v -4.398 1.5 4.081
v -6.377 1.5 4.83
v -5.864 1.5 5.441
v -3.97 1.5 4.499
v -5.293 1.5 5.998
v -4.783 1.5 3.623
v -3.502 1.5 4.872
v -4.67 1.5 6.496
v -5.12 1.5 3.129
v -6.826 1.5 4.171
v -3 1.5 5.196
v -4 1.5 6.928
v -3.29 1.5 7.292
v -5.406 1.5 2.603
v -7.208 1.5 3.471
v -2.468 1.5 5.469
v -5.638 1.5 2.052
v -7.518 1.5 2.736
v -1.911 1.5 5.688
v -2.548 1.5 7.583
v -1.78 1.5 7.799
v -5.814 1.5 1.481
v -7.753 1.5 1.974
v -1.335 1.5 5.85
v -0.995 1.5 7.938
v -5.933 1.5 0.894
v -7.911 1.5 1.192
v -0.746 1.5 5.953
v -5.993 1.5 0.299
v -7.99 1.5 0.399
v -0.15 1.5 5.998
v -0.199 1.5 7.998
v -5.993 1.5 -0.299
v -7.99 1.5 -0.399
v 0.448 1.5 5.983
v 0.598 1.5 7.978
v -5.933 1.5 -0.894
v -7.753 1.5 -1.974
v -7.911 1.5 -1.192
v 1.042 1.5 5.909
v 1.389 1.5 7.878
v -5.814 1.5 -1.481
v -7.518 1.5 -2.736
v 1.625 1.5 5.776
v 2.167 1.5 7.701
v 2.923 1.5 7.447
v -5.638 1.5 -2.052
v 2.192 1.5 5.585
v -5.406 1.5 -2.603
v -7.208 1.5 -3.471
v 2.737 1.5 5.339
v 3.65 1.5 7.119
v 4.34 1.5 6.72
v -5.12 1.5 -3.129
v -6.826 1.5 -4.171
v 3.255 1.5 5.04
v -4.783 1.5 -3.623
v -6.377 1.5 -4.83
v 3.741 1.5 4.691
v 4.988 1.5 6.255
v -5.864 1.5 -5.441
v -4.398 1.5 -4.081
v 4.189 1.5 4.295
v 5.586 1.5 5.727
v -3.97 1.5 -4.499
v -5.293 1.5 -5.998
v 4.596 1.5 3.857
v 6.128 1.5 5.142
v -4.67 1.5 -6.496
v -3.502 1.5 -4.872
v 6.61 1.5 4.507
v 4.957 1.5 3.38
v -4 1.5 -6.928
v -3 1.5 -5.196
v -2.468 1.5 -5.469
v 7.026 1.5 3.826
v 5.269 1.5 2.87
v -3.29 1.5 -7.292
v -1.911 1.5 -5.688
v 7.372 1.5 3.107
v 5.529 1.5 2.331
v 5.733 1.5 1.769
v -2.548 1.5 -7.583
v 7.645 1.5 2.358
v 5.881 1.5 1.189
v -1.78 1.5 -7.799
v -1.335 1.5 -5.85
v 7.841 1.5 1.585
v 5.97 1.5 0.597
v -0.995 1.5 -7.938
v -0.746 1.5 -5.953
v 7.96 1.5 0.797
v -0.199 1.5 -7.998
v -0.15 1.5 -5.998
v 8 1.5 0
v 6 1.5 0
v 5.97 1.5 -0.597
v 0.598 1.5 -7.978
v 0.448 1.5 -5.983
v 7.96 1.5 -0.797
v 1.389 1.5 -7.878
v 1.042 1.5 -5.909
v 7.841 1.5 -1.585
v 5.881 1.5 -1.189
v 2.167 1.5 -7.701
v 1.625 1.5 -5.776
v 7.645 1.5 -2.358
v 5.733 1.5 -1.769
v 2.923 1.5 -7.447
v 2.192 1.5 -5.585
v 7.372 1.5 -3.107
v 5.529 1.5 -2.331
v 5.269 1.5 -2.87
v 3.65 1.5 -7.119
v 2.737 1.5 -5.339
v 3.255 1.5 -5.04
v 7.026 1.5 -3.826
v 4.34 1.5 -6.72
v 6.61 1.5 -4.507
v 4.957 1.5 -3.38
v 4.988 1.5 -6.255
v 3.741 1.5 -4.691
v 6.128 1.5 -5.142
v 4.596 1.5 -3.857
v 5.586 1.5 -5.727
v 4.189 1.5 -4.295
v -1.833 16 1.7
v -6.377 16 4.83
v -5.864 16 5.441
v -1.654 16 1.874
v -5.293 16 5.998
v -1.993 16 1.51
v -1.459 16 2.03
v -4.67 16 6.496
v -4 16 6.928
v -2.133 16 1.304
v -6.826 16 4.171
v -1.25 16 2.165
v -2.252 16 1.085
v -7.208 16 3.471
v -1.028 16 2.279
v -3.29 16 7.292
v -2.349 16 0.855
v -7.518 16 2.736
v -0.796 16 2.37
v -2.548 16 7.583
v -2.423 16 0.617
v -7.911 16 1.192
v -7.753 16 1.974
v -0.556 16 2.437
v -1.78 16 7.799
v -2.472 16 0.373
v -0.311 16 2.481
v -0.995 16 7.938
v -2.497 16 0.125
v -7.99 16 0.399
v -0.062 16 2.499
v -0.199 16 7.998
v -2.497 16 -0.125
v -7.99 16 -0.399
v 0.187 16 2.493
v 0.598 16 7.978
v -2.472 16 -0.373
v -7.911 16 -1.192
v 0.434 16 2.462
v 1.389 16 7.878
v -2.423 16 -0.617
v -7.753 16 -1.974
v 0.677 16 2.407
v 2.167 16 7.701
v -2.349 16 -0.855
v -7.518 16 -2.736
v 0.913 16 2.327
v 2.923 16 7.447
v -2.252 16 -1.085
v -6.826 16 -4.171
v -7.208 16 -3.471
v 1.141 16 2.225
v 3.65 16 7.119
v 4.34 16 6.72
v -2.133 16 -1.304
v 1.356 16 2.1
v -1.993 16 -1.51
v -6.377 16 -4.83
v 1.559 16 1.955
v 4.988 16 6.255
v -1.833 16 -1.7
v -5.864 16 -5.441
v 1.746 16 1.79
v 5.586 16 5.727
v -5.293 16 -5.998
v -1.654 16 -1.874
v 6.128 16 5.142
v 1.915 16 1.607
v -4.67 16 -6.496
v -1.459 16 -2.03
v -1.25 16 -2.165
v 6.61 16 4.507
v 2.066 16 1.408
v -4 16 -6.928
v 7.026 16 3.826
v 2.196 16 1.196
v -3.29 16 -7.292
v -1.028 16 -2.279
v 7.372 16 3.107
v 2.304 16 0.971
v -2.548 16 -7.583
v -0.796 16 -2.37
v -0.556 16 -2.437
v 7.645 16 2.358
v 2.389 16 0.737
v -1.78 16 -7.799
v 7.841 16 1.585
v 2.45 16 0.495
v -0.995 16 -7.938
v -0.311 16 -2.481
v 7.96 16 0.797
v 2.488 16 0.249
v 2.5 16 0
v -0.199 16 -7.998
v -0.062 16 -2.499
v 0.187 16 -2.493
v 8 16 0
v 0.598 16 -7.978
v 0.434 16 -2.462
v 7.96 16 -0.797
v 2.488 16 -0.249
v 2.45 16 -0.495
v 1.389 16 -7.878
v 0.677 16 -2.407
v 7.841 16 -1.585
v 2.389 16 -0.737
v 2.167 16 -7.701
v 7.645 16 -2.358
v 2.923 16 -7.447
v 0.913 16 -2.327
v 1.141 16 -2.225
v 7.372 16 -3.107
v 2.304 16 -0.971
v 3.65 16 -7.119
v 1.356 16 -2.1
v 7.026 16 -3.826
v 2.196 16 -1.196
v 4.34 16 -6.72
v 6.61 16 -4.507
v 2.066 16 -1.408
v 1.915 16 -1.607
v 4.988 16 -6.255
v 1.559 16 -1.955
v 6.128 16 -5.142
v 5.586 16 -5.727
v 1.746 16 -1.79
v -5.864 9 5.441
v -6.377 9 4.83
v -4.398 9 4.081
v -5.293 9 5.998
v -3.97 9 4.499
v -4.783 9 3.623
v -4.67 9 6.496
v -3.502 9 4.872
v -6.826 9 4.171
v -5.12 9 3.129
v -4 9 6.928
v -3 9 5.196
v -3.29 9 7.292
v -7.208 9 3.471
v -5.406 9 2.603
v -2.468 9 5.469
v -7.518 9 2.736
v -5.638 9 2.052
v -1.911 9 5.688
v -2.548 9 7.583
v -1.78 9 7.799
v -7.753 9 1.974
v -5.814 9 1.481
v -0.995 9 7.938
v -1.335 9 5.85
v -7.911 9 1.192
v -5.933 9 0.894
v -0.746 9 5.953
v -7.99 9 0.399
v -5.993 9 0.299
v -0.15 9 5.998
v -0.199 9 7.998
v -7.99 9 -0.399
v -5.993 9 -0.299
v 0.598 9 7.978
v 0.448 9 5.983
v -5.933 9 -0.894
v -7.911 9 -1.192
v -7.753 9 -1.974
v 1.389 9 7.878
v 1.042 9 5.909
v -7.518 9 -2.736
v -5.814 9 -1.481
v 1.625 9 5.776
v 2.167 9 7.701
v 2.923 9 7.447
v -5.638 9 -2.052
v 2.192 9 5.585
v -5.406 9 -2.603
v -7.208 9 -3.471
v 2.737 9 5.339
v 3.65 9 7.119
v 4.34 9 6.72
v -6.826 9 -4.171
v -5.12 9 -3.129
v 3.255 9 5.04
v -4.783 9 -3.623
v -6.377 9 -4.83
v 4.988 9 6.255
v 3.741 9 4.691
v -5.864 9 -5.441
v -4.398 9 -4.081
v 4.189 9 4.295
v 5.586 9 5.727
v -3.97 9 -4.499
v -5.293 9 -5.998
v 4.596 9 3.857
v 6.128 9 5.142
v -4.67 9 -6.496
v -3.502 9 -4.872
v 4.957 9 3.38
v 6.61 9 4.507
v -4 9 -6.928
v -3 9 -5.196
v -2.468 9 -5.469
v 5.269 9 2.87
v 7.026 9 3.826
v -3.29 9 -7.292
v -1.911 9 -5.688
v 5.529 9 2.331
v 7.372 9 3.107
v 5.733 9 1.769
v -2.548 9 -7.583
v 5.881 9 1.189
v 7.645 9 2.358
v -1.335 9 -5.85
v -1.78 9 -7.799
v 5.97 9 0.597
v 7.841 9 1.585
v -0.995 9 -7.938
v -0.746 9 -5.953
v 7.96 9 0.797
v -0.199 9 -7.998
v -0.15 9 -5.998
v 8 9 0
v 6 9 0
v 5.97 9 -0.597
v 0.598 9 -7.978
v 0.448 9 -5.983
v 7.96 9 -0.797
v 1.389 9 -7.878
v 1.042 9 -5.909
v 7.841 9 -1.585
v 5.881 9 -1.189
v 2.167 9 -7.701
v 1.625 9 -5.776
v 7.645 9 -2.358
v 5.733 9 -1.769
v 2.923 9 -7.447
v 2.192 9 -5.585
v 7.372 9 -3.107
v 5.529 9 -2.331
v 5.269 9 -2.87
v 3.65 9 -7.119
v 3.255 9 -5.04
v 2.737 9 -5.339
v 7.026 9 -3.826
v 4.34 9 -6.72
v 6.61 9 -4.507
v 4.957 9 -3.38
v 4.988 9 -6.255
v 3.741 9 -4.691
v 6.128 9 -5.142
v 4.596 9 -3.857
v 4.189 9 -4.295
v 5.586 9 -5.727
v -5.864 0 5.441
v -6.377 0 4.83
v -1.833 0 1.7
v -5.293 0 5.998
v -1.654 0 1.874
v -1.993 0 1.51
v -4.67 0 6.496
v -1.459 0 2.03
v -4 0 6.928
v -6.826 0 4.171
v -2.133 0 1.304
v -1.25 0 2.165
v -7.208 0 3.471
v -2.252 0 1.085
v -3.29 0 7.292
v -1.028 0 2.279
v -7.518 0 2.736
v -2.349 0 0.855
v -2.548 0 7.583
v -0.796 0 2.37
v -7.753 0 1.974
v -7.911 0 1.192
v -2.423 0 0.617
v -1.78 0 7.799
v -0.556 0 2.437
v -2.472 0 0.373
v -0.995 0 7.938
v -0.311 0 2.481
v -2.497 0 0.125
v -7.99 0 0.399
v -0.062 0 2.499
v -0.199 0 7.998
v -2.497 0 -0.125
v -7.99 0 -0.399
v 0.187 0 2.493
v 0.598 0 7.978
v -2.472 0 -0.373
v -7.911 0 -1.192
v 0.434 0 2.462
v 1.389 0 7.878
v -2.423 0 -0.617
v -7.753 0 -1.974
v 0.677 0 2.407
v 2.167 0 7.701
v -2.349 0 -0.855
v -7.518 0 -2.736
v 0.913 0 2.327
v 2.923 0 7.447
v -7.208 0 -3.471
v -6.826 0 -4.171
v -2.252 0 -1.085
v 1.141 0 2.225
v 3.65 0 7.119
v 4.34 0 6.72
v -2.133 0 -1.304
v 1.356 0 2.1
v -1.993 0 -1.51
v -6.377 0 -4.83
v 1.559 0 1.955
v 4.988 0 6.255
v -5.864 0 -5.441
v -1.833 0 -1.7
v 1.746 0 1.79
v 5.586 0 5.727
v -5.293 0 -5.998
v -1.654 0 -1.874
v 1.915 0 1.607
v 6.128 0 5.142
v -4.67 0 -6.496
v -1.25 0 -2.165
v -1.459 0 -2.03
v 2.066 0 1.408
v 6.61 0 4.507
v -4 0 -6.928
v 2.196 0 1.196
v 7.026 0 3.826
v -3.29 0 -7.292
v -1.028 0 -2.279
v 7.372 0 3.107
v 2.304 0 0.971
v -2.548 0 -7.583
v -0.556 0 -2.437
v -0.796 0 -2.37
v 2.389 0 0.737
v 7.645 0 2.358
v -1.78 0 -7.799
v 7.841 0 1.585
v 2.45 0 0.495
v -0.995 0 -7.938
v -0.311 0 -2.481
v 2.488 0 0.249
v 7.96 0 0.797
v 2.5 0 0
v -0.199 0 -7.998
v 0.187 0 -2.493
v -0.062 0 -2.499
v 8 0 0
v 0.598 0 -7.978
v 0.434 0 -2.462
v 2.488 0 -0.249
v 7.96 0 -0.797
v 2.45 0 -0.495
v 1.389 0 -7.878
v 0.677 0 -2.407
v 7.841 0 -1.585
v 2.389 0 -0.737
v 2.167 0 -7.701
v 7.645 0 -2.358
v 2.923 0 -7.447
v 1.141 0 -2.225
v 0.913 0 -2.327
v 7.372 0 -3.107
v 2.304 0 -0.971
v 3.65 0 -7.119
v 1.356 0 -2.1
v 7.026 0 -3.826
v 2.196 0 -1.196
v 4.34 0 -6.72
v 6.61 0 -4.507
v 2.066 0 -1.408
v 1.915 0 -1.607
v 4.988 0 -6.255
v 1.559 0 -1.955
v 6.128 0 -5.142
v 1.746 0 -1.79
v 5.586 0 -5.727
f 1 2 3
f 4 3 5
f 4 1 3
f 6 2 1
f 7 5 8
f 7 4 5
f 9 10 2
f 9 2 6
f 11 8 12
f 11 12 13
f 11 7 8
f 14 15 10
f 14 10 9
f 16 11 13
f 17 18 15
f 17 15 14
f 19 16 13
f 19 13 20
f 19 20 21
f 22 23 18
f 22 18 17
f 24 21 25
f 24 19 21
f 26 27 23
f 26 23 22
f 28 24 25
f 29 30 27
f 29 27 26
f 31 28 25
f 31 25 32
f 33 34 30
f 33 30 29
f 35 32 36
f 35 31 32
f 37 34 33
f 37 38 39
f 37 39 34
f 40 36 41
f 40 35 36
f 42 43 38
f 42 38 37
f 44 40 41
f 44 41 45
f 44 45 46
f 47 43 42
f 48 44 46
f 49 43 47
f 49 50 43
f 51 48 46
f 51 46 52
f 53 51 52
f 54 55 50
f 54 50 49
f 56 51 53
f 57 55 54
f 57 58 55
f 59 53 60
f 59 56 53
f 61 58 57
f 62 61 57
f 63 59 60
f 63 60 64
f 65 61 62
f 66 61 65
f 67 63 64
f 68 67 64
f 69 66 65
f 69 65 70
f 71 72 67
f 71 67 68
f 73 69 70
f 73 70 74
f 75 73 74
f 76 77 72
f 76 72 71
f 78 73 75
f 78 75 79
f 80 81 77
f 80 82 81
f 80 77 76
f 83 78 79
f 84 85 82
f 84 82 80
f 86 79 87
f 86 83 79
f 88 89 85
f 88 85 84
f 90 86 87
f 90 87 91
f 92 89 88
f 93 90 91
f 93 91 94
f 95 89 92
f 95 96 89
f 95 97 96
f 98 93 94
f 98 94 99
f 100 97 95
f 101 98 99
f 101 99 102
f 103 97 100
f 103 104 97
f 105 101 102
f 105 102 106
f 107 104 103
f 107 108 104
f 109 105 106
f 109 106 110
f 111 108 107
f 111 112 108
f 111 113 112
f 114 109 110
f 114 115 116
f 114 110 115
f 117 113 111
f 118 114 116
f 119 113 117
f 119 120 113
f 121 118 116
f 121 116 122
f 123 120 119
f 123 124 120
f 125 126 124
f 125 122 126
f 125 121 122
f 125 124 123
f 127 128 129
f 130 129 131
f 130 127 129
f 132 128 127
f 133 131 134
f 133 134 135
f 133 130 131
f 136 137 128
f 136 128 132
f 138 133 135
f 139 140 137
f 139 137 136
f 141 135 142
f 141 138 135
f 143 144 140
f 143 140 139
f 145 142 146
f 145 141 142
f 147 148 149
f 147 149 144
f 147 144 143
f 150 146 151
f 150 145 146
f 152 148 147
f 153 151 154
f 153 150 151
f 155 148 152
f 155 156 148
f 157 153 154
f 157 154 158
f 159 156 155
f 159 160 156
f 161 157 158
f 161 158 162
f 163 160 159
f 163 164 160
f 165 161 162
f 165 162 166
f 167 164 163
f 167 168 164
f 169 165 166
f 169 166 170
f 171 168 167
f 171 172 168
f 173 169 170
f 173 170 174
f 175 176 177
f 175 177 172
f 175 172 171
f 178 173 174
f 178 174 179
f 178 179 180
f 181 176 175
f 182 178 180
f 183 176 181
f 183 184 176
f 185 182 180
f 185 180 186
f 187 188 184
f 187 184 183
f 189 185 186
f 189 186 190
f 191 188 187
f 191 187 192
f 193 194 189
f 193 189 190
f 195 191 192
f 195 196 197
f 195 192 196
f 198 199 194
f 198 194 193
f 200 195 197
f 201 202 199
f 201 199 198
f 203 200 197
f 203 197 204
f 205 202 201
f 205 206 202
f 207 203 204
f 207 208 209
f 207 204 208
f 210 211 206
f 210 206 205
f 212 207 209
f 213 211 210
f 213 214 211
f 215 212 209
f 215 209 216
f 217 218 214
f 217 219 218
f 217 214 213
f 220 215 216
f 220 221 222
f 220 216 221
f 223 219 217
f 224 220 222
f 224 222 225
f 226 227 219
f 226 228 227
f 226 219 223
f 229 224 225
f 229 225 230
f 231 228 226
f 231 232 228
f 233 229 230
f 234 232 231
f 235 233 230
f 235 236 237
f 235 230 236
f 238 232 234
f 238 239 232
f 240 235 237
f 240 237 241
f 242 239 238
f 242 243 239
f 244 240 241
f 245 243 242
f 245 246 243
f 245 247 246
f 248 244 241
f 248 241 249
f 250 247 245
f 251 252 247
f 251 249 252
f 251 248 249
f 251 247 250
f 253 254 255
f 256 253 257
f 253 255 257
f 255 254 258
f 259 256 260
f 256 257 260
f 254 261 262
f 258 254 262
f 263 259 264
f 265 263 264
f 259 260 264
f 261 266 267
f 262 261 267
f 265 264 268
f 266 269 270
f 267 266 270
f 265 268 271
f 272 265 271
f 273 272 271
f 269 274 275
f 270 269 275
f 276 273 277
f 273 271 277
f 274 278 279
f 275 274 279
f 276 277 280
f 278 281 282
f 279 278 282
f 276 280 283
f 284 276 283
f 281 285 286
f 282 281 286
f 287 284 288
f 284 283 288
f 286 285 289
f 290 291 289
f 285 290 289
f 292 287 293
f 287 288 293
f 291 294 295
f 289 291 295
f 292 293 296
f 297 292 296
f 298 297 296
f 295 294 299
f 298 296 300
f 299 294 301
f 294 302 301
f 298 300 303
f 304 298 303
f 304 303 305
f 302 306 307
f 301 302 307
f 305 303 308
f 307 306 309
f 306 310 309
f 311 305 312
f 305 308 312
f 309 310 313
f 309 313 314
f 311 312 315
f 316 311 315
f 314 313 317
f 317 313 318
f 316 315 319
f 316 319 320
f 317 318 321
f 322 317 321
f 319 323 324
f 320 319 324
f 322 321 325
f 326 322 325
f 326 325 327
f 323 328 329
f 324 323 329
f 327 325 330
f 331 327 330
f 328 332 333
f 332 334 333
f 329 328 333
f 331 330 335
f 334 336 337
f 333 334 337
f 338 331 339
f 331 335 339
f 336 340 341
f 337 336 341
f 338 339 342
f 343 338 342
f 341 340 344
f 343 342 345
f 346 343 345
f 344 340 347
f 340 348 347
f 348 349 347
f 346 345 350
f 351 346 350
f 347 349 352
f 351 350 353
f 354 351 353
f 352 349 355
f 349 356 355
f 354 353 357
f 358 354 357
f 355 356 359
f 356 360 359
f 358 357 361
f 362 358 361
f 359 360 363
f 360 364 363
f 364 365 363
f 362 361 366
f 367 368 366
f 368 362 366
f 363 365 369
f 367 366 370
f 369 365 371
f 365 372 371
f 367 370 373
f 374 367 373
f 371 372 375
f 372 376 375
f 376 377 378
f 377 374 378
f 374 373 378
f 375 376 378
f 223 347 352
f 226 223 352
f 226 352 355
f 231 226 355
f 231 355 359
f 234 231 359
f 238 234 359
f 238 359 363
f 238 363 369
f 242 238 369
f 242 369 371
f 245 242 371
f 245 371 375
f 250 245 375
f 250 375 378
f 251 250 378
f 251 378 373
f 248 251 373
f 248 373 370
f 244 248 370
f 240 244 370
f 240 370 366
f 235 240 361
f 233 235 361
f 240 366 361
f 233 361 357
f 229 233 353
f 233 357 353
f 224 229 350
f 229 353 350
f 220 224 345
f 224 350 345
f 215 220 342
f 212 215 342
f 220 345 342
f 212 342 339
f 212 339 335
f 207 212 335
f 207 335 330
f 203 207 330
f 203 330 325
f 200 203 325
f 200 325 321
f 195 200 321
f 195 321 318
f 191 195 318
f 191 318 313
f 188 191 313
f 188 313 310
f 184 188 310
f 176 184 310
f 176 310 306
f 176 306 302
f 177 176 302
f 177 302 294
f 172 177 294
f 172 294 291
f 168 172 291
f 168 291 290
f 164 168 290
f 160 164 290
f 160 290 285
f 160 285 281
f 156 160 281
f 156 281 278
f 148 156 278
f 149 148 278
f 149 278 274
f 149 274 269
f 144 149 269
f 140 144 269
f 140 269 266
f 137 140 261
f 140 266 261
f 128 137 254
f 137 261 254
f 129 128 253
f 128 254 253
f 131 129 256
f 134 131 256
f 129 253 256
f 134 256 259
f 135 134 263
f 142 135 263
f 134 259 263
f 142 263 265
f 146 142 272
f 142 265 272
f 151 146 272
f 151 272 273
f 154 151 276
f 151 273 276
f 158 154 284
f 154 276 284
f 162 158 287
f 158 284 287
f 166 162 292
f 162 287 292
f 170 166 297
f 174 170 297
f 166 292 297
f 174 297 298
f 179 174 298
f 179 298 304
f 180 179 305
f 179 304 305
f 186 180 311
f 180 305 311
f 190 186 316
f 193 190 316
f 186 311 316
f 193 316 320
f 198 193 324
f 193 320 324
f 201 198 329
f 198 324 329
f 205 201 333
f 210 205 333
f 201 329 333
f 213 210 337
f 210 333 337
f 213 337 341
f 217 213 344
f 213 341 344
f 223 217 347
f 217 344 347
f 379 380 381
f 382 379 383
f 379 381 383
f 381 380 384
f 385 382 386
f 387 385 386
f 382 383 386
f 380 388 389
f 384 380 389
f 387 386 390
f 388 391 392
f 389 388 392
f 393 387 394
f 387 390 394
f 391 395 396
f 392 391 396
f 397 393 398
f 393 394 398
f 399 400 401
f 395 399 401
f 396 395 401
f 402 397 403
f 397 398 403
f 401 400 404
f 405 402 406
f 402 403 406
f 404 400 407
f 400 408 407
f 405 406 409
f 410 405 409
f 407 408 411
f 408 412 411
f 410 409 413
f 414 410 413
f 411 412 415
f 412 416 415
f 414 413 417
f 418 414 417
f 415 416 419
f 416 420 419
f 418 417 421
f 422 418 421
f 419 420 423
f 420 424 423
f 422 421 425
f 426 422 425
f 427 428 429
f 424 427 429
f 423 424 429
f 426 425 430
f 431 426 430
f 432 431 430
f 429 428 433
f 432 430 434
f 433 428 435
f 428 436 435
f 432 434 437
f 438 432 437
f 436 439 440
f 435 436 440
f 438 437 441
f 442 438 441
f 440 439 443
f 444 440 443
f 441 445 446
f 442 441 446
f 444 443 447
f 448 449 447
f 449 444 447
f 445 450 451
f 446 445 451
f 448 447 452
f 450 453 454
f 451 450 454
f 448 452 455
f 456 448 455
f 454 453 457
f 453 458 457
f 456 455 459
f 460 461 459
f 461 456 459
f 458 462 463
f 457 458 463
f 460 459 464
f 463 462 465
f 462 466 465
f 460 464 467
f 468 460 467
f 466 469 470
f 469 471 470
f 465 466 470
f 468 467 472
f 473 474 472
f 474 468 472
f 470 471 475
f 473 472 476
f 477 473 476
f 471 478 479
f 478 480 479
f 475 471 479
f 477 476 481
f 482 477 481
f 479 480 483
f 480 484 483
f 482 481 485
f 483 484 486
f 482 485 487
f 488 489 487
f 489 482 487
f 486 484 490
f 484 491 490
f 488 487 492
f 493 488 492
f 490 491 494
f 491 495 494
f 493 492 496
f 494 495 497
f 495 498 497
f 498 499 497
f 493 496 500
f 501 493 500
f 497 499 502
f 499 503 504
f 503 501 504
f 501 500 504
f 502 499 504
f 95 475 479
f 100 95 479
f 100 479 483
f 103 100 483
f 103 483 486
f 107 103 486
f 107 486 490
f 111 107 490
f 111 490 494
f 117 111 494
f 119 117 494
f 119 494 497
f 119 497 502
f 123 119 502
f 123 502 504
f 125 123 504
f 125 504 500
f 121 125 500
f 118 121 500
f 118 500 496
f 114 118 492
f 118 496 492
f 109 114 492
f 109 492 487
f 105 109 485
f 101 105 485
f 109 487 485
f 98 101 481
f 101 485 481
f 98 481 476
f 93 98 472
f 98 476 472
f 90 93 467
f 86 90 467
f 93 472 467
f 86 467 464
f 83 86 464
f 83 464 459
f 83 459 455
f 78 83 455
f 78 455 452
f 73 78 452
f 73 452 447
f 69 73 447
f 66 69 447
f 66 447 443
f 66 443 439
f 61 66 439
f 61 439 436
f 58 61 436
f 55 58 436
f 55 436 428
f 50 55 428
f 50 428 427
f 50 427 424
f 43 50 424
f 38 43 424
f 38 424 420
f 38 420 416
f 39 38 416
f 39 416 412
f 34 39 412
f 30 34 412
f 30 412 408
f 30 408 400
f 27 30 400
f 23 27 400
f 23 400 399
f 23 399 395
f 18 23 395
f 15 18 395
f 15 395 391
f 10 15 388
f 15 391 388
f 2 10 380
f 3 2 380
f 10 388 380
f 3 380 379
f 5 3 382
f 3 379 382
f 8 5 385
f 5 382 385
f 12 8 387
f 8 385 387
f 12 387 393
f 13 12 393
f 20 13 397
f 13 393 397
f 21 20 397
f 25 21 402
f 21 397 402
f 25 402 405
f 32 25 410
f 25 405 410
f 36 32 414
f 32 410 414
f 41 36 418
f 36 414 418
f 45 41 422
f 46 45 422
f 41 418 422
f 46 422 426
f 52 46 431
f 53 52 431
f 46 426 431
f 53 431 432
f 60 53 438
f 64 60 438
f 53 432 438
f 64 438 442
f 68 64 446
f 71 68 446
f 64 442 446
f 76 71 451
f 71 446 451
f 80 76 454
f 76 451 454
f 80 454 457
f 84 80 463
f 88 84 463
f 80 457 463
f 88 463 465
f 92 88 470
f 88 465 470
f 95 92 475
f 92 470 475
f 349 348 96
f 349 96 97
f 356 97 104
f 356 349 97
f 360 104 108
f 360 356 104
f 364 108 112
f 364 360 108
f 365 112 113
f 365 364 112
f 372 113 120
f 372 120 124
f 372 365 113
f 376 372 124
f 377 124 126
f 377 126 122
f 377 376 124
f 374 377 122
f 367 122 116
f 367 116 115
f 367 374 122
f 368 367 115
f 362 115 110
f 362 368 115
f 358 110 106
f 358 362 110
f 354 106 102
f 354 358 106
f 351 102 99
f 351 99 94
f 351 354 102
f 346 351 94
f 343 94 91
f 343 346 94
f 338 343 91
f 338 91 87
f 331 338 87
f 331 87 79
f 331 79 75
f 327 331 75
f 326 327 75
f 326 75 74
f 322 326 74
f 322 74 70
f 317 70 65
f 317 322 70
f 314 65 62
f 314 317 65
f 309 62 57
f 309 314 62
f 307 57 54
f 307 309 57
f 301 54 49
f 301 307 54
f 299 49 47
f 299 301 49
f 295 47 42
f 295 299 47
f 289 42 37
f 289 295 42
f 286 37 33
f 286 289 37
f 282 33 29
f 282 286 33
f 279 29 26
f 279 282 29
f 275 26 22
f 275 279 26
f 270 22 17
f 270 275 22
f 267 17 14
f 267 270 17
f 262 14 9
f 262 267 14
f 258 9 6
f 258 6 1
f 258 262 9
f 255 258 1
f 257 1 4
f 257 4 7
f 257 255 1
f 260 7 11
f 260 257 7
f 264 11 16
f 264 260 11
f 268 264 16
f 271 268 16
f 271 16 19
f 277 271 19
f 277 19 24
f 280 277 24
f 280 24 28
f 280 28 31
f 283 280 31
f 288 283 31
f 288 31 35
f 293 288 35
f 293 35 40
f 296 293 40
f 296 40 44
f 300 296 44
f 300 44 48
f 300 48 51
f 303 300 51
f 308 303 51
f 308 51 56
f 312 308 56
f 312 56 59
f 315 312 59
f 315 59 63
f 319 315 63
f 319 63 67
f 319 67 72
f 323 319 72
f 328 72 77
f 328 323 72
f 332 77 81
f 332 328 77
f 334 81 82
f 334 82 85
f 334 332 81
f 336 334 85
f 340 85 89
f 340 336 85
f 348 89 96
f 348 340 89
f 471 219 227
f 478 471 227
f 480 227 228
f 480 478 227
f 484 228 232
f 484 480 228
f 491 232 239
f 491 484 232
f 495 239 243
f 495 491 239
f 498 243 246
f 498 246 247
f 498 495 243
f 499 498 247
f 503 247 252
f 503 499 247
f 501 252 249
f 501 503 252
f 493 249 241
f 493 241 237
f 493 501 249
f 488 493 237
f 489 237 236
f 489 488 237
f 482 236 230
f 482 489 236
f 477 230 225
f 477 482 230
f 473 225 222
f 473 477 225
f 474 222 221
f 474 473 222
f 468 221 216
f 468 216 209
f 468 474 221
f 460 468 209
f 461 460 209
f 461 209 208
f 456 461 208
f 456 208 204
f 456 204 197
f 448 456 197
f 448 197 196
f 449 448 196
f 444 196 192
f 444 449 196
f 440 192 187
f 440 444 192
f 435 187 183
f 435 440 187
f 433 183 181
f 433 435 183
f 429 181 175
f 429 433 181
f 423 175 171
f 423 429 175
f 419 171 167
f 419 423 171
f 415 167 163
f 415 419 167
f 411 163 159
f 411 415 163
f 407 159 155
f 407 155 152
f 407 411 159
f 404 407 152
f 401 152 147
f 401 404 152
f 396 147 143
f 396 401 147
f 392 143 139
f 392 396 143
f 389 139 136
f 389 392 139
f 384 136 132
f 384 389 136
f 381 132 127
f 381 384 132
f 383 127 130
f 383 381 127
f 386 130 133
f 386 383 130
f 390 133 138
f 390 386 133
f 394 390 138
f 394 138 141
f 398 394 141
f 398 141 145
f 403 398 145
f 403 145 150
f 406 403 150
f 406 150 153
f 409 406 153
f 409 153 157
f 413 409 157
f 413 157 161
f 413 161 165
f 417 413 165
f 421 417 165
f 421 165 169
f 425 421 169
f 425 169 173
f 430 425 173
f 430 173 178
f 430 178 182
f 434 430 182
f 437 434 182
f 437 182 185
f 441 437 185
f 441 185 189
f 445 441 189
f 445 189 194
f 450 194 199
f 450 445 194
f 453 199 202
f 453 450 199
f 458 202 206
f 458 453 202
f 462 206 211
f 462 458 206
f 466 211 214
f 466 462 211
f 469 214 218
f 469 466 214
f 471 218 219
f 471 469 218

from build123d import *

# Parameters (mm, degrees)
SKETCH1_R           = 8
SKETCH1_R_2         = 2.5
BOSS_EXTRUDE1_DEPTH = 16
CUT_EXTRUDE1_START  = -7
SKETCH2_R           = 8
SKETCH2_R_2         = 6
CUT_EXTRUDE1_DEPTH  = 7.5


with BuildPart() as part:
    # Sketch1 → Boss-Extrude1 (new body)
    with BuildSketch(Plane(origin=(0, 0, 0), x_dir=(1, 0, 0), z_dir=(0, 1, 0))):
        Circle(SKETCH1_R)
        Circle(SKETCH1_R_2, mode=Mode.SUBTRACT)
    extrude(amount=BOSS_EXTRUDE1_DEPTH)

    # Sketch2 → Cut-Extrude1 (cut)
    with BuildSketch(Plane(origin=(0, 16, 0), x_dir=(1, 0, 0), z_dir=(0, 1, 0)).offset(CUT_EXTRUDE1_START)):
        Circle(SKETCH2_R)
        Circle(SKETCH2_R_2, mode=Mode.SUBTRACT)
    extrude(amount=-CUT_EXTRUDE1_DEPTH, mode=Mode.SUBTRACT)


solid = part.part
